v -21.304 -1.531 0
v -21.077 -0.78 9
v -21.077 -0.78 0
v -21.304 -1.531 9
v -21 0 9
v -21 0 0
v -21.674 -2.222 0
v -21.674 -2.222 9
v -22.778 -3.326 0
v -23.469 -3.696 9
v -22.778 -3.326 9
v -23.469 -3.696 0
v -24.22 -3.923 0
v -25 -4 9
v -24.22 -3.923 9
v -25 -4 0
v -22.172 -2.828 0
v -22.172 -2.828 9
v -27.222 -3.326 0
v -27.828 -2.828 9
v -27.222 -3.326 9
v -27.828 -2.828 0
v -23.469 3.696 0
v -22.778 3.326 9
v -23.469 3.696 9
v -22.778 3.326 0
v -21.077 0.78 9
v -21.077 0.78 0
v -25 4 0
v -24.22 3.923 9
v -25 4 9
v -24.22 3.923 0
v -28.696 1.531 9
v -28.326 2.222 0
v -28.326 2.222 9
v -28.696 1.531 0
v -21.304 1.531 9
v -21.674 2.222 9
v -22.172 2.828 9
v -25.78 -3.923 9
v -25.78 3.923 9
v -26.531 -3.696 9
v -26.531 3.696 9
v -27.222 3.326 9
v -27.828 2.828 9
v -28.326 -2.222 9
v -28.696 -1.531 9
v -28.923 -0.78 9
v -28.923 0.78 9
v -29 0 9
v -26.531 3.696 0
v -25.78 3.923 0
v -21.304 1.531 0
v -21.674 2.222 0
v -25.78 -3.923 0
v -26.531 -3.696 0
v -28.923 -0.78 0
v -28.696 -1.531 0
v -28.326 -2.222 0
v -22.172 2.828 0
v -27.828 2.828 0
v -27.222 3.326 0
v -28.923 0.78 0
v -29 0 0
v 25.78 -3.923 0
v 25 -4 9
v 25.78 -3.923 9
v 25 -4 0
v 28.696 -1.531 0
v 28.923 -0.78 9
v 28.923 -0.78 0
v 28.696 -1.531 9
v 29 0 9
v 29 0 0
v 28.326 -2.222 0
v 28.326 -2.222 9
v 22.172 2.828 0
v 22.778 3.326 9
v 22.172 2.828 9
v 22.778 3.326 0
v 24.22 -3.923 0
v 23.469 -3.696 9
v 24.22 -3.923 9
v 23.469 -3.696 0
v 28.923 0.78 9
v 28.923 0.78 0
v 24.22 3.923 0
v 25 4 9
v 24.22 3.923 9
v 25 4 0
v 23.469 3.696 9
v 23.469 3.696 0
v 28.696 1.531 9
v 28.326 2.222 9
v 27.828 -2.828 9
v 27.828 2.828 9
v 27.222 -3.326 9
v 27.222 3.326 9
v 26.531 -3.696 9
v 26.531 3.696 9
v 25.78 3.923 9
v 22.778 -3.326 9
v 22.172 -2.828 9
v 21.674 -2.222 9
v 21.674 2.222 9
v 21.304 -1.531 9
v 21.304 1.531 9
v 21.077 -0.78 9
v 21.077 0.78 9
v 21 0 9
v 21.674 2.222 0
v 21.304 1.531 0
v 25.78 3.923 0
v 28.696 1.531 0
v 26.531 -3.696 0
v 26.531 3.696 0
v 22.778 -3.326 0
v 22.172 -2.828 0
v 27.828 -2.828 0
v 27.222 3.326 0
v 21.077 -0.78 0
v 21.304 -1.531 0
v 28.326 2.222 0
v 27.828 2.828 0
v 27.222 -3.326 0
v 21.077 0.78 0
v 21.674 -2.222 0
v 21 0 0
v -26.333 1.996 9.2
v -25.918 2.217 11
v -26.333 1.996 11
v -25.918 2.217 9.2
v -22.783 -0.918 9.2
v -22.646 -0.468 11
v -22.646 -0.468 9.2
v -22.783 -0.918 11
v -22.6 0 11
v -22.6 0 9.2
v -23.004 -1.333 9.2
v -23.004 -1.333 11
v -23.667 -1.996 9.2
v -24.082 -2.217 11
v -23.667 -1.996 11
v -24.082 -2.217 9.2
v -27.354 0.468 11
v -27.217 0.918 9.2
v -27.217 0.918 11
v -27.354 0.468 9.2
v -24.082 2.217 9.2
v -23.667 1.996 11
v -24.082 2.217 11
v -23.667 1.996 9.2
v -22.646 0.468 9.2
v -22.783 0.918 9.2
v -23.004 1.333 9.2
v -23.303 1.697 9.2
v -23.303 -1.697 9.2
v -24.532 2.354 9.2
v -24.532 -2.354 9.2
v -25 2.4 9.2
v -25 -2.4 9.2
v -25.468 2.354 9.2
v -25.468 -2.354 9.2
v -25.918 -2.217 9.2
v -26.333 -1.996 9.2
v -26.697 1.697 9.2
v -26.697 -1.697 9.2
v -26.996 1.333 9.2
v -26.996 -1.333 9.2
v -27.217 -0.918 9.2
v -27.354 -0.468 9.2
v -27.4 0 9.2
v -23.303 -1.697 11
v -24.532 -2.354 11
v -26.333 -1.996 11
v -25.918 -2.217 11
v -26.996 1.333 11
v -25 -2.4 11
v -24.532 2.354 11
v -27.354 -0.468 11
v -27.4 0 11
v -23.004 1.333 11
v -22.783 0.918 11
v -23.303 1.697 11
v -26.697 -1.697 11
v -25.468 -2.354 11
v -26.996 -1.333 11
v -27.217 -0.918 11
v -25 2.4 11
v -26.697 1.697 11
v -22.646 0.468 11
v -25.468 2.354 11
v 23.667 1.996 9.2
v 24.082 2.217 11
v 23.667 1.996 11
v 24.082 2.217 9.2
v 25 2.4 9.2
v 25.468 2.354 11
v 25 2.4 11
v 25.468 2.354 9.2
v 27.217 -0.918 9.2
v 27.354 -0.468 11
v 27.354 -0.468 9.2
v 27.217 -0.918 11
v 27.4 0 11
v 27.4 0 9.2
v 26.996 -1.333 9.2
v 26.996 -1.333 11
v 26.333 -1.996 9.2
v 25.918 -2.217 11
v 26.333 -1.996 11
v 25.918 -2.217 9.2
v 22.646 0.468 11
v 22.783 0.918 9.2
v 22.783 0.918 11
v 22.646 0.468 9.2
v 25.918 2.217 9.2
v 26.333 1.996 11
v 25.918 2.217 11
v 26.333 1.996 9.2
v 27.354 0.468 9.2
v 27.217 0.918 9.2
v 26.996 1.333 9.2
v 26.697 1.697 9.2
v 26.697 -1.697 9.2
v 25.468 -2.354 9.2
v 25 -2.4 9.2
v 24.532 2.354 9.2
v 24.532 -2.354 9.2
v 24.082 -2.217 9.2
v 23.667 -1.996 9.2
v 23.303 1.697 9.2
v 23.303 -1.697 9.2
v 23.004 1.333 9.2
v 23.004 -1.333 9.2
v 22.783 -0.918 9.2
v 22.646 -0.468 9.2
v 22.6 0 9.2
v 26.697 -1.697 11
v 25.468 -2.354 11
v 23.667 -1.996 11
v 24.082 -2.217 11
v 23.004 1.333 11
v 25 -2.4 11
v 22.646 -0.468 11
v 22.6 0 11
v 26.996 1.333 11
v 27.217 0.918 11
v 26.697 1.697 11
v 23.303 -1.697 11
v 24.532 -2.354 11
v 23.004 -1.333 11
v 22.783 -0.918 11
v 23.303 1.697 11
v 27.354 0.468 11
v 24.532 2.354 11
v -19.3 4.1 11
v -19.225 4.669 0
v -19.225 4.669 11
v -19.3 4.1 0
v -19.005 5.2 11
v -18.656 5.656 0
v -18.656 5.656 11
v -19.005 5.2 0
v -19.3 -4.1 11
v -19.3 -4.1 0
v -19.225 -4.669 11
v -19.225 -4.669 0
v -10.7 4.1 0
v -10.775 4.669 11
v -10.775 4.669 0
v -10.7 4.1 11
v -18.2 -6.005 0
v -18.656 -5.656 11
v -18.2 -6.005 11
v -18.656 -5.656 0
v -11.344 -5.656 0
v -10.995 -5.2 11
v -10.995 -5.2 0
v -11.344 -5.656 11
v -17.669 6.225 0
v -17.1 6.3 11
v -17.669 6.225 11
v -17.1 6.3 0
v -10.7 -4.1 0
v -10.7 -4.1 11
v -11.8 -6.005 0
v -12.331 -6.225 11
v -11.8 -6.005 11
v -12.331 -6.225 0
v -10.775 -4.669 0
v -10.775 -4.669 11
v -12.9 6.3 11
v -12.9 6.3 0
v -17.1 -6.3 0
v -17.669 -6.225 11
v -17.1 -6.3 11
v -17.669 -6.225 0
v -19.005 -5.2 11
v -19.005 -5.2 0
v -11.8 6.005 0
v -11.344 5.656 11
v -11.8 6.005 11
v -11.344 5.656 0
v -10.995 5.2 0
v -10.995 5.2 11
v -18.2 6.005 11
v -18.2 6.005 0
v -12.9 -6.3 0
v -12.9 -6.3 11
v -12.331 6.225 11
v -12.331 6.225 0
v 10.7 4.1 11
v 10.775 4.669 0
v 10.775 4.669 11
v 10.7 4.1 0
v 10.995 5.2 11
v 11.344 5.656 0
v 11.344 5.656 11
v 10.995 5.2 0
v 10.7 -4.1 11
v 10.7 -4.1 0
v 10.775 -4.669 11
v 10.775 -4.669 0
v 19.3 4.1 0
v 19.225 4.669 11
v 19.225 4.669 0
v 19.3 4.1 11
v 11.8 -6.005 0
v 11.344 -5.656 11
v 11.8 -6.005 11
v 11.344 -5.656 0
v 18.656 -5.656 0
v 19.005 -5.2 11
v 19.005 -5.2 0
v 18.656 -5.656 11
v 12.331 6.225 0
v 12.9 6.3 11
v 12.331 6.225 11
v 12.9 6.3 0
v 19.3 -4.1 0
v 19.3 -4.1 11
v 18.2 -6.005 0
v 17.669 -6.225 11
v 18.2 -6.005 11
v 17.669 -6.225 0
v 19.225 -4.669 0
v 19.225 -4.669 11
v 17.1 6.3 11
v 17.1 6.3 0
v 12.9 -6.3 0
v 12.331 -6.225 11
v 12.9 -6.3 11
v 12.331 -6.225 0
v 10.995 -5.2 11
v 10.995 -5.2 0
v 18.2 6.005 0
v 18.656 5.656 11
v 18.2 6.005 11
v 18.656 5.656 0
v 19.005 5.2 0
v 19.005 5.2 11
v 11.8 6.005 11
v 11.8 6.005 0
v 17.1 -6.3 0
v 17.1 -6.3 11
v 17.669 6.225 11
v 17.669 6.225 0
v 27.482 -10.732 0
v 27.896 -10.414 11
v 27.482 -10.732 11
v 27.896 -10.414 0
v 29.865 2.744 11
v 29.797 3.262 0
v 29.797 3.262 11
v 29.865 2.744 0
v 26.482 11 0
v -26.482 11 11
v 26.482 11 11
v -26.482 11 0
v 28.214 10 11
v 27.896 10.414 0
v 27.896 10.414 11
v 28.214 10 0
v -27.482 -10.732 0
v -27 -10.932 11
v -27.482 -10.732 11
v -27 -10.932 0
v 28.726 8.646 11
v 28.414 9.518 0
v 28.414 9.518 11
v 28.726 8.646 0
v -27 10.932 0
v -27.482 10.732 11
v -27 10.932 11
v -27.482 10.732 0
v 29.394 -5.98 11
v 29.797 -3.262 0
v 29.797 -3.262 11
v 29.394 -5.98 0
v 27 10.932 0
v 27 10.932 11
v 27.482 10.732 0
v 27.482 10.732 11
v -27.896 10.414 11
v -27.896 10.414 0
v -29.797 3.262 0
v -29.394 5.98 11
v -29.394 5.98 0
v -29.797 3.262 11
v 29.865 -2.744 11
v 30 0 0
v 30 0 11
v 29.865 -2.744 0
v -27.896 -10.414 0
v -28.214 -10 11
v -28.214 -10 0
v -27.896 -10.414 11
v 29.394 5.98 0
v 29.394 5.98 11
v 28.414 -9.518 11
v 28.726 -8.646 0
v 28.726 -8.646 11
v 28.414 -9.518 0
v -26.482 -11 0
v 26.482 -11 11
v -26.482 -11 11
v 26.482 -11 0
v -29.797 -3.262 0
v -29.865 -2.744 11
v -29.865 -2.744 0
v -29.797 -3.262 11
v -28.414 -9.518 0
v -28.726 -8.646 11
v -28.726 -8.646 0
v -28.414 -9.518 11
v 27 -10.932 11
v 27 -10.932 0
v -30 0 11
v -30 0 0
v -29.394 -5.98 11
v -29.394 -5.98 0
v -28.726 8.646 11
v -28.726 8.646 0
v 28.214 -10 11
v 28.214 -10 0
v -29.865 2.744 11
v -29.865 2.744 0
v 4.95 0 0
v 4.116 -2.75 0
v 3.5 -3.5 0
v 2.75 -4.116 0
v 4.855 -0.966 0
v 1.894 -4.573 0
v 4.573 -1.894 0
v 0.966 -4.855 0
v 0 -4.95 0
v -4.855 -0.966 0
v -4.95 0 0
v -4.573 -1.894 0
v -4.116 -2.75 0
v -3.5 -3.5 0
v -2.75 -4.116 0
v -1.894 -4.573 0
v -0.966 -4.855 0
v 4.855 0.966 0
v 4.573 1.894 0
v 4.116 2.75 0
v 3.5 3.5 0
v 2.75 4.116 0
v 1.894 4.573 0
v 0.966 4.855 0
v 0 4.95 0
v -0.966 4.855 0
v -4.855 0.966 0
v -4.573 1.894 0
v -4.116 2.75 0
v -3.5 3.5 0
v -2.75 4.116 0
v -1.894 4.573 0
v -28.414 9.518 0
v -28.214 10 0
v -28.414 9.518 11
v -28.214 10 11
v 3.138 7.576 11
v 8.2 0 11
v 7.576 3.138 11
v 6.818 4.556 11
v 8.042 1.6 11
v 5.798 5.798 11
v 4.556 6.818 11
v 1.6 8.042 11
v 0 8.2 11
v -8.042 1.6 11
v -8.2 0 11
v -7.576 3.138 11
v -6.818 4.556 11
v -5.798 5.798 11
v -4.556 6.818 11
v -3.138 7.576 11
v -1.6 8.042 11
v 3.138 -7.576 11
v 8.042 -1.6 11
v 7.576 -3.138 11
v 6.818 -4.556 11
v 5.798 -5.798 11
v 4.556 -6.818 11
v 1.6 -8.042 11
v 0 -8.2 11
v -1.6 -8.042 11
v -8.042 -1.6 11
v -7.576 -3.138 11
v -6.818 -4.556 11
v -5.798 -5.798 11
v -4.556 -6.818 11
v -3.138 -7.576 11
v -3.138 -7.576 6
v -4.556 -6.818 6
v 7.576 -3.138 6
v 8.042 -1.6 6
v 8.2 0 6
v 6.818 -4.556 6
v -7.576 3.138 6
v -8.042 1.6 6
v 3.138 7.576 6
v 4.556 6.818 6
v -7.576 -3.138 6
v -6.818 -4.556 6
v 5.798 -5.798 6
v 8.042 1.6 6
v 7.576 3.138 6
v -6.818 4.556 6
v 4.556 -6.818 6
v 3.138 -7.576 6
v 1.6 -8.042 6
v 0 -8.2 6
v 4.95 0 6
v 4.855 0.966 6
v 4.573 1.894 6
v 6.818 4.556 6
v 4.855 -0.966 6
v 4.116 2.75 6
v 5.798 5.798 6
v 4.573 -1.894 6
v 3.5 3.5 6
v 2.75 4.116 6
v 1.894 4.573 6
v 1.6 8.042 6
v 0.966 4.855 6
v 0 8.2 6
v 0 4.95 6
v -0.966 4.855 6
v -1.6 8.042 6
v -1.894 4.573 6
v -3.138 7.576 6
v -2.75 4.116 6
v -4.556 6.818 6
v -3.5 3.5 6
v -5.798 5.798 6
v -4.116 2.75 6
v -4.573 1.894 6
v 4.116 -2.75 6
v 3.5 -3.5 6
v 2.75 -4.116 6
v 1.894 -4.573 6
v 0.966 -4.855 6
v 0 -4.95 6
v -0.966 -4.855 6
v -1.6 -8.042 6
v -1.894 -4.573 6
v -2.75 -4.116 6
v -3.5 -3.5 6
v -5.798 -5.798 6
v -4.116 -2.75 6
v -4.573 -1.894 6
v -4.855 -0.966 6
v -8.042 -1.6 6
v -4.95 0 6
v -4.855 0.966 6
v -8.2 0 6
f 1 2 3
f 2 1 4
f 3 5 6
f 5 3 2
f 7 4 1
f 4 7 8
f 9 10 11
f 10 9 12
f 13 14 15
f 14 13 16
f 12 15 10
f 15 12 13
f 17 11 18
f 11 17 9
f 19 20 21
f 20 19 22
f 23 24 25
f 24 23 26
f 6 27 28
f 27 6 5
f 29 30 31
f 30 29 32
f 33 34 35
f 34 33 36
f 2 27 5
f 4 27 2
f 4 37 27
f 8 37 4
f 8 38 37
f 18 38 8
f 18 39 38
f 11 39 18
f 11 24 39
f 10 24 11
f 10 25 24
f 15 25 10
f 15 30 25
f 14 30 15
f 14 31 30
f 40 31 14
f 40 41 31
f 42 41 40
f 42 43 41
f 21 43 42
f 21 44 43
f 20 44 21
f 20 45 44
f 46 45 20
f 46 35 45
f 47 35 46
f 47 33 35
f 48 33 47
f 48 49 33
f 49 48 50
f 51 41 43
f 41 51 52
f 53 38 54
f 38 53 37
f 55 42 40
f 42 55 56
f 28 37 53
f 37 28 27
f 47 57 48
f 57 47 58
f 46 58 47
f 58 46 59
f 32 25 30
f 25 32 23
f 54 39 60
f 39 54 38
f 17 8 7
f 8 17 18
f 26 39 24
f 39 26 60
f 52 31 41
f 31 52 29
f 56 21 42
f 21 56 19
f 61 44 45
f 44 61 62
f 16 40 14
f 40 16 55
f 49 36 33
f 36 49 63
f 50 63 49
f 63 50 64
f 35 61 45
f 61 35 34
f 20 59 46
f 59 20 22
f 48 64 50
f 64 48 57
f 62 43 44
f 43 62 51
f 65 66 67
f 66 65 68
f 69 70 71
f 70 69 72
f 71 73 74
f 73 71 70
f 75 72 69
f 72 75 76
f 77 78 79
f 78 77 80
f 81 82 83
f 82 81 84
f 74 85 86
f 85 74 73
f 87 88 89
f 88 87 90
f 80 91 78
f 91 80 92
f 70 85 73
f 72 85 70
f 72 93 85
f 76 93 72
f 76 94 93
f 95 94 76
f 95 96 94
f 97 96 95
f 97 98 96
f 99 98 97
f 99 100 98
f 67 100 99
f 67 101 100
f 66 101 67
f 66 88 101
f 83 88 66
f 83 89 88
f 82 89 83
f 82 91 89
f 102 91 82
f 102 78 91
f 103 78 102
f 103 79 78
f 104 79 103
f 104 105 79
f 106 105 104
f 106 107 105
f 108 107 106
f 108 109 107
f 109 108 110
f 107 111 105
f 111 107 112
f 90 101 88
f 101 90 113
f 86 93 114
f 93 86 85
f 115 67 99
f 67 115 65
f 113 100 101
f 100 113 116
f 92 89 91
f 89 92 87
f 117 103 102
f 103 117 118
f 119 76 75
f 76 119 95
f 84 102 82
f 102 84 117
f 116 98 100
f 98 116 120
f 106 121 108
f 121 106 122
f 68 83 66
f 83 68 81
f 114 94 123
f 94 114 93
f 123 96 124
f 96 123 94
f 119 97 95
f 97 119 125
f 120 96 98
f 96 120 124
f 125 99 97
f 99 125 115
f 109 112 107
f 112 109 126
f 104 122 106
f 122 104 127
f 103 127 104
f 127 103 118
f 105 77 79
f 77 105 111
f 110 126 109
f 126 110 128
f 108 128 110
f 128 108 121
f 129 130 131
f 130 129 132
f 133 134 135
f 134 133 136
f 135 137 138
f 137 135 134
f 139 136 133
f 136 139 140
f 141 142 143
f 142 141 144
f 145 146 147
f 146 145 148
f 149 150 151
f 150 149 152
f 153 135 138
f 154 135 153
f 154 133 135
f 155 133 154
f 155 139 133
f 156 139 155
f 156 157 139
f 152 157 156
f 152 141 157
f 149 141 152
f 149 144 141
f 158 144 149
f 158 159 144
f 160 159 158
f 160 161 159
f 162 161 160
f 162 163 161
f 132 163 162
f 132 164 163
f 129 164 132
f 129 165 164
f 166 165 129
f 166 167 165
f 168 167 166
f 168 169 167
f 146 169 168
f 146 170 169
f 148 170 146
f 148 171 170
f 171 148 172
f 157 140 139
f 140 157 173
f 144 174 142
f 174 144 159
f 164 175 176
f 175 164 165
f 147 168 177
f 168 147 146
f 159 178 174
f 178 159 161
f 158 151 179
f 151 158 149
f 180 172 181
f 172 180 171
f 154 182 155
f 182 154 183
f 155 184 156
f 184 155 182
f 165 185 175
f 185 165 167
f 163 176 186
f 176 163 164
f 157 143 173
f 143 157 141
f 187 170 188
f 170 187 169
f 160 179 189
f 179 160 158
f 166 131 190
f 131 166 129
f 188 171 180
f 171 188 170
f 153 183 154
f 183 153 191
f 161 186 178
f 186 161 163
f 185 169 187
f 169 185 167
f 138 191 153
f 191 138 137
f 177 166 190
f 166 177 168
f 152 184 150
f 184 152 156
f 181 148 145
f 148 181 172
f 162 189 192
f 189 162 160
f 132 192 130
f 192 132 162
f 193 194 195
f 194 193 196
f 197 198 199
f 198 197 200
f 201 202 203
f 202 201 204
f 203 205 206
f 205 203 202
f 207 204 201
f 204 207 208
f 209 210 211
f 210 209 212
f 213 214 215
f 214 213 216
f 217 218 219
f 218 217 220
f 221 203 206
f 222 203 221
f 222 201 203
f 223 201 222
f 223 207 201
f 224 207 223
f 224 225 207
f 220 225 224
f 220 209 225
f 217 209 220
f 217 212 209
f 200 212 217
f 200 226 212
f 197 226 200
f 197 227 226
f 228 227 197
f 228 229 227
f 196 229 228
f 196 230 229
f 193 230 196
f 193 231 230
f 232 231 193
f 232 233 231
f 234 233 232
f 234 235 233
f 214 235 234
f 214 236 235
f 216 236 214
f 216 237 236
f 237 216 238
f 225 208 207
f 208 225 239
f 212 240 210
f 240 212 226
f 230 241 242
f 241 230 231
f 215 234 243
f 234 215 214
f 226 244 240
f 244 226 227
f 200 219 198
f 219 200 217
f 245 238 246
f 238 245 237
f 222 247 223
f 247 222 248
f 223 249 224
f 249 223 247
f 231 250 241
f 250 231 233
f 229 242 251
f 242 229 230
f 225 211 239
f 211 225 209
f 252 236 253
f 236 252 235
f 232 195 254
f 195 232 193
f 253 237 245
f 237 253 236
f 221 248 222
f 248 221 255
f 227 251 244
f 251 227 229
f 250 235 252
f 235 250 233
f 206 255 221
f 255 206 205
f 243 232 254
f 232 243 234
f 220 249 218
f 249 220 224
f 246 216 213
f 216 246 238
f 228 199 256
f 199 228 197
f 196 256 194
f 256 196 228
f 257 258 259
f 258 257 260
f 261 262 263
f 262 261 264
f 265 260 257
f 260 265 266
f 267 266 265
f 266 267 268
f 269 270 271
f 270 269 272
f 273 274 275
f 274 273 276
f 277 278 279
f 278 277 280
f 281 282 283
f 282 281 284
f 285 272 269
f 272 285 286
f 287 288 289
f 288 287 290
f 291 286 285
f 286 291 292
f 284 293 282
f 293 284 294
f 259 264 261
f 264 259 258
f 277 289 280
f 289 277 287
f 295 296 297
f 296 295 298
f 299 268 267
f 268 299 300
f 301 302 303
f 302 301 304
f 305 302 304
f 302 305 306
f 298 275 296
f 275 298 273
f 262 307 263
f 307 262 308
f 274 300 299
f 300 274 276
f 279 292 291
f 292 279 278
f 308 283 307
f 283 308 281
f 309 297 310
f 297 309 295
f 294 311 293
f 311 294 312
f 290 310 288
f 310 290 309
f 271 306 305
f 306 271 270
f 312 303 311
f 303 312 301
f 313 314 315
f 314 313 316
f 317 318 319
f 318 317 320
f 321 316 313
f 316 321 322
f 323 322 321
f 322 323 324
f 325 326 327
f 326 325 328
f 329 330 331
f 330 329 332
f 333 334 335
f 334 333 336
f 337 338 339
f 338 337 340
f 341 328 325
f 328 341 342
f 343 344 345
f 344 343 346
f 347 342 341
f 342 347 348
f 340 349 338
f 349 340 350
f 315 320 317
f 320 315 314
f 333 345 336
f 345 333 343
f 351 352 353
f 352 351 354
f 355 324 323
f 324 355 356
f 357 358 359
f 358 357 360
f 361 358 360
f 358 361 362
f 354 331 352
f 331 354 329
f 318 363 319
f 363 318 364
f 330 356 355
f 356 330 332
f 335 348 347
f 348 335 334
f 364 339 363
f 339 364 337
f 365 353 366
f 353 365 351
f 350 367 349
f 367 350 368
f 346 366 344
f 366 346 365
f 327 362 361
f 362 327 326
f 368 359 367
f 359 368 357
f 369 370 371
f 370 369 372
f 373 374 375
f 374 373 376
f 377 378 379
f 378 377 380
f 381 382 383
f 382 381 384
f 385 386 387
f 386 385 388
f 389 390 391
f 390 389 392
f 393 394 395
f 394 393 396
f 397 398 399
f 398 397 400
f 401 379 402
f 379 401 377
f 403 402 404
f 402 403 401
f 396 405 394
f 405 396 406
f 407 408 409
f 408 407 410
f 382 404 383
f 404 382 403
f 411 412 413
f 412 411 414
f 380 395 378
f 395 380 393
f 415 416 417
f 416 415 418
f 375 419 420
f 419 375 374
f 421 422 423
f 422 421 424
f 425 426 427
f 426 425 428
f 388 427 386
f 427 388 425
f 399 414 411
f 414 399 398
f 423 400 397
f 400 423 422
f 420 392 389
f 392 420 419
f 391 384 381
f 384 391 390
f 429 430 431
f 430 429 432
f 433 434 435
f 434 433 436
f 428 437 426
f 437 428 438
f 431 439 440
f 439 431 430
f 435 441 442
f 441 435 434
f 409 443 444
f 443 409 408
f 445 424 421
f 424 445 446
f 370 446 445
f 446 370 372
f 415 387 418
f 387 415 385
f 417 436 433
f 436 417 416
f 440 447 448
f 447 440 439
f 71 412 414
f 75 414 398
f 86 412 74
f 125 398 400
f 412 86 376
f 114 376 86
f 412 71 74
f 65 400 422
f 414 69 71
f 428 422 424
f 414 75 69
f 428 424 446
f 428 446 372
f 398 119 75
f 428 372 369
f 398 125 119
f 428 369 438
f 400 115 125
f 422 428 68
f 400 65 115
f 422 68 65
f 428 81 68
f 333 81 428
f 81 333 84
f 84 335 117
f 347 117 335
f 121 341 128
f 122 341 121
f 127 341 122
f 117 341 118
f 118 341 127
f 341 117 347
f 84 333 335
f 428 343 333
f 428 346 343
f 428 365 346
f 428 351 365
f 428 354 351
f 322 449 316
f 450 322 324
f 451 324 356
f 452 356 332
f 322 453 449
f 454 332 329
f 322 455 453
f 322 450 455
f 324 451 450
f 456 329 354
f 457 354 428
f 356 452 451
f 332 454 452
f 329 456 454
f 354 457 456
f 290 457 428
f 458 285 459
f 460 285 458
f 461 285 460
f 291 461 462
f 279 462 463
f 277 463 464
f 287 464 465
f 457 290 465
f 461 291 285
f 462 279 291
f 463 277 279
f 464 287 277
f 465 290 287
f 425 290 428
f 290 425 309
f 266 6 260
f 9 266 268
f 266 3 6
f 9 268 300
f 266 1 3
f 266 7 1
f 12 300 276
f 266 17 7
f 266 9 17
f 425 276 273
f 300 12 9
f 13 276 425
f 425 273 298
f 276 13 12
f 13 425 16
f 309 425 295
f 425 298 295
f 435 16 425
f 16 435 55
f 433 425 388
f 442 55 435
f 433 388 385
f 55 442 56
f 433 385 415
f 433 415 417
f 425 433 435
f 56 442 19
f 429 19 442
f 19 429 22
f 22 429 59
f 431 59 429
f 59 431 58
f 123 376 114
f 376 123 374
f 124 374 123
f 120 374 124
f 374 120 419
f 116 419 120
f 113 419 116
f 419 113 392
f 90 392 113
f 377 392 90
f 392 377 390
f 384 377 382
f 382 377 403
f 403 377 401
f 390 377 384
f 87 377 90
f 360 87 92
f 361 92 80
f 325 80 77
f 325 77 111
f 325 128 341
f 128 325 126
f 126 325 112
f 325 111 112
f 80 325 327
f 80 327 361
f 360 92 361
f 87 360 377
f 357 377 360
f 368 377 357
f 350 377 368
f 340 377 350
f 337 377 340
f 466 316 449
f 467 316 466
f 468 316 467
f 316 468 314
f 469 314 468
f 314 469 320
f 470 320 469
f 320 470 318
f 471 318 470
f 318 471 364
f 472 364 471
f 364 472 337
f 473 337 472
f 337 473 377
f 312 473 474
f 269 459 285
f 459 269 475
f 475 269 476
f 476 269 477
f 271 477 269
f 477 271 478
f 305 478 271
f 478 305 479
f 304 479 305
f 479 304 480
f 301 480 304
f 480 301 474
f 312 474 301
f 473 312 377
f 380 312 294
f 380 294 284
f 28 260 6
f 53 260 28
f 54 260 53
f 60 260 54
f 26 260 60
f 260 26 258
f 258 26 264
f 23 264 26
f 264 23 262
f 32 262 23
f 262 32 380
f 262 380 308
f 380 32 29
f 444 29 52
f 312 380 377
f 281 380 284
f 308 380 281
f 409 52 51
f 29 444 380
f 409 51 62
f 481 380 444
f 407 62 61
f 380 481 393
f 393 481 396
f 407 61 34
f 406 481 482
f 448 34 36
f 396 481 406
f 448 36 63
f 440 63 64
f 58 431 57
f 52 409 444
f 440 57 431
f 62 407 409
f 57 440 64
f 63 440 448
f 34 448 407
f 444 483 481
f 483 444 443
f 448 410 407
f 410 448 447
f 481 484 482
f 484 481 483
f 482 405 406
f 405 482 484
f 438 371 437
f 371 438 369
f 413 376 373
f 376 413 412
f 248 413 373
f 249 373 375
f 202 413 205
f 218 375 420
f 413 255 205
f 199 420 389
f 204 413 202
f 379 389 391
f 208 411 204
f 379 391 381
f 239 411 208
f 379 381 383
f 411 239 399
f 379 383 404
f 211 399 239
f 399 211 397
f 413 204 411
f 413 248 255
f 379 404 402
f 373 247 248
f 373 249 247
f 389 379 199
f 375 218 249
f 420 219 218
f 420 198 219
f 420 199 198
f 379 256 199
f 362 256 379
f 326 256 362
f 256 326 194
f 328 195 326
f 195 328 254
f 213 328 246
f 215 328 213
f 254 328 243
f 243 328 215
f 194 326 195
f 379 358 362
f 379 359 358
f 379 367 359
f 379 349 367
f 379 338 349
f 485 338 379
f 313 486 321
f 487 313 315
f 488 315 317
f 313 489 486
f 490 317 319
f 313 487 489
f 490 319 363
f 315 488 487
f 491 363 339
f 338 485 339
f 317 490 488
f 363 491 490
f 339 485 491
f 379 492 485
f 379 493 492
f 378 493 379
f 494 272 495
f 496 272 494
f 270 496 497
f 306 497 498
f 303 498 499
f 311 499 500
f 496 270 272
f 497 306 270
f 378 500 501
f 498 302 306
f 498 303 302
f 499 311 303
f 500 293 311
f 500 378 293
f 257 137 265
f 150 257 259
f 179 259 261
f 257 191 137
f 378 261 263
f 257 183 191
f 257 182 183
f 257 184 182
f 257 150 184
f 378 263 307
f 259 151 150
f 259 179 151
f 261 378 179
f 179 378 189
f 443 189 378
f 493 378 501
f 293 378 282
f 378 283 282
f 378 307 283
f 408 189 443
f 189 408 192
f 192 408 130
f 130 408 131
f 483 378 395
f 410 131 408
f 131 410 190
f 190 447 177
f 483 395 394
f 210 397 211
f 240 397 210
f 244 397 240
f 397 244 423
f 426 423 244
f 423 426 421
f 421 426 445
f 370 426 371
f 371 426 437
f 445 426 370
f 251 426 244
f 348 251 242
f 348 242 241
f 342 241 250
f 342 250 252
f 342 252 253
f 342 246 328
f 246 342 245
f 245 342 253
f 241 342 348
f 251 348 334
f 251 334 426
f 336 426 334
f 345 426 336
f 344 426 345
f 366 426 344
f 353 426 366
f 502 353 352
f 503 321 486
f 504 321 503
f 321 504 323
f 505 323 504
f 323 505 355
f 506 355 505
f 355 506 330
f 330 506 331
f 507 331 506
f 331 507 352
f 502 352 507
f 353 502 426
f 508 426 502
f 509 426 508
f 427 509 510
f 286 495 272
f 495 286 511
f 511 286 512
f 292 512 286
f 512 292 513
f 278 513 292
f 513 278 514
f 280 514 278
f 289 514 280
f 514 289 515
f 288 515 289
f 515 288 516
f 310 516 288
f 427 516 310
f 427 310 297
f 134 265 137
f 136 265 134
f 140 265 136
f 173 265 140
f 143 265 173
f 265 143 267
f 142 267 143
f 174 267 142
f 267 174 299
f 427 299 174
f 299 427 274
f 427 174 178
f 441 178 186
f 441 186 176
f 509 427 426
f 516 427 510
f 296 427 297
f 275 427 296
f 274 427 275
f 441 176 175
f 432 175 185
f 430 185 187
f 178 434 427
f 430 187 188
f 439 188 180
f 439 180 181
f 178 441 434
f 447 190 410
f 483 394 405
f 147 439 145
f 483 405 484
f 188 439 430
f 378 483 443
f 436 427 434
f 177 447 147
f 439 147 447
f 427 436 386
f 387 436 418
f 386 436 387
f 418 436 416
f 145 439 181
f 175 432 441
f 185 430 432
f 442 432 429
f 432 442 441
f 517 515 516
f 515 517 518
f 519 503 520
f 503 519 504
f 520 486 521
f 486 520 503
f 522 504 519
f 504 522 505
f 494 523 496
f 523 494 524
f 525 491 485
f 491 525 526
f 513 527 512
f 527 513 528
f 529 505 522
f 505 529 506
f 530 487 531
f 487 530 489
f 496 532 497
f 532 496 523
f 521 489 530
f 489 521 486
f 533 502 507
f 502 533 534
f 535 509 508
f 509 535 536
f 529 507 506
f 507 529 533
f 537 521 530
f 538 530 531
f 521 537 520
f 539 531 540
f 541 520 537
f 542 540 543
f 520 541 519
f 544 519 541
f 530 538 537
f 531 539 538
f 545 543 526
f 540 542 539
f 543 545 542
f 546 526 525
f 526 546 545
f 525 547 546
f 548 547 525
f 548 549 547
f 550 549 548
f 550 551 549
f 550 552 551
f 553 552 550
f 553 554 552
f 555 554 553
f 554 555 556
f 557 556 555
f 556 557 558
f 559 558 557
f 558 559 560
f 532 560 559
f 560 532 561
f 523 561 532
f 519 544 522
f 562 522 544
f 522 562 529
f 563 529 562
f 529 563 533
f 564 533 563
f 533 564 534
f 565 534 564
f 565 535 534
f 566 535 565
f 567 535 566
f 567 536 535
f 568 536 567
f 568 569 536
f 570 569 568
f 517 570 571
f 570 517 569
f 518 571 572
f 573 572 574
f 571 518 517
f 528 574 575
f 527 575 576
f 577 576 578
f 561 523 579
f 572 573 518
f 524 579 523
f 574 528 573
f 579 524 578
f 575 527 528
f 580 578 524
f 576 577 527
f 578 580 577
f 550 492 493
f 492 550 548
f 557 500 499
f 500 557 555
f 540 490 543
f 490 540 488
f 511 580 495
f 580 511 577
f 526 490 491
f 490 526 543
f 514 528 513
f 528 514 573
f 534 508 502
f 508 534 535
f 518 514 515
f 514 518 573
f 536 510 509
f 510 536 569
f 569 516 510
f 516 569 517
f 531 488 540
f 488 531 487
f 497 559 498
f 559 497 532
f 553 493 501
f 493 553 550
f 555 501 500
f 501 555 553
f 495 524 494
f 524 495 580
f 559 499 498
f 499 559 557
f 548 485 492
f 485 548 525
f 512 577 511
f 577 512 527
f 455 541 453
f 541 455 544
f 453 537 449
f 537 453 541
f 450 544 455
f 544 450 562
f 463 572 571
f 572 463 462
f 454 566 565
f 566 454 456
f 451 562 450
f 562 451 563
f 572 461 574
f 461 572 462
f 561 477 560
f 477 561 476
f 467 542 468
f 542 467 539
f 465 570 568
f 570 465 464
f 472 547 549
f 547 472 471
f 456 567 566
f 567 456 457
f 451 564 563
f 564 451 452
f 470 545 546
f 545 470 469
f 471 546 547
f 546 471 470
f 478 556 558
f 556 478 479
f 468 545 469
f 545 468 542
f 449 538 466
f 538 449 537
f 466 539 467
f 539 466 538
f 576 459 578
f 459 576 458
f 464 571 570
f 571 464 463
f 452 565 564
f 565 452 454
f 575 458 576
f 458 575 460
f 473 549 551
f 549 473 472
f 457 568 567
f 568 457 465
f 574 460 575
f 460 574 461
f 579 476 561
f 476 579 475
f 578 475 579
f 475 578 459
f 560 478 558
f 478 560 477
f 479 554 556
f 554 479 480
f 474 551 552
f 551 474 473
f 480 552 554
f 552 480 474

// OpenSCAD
module bowden_clamp() difference() {
	linear_extrude(height=11,convexity=30) difference() {
		// basic shape
		minkowski() {
			intersection() {
				square([60-2,22-4],center=true);
				circle(r=30-2,$fn=64);
			}
			// rounded corners
			circle(r=2,$fn=24);
		}
	}
	// M4 socket heads
	for(x=[-25,25]) translate([x,0,2])
		cylinder(r=4,h=12,$fn=32);

	// M4 Mounting holes
	for(x=[-25,25]) translate([x,0,-1])
		cylinder(r=2.4,h=2.8,$fn=32);

	// groove mount
	translate([0,0,-1]) cylinder(r=8.2,h=6,$fn=32);

	// M6 captive nut
//	cylinder(r=6.9,h=8,$fn=6); // LP

	// M6 pneumatic fitting
	cylinder(r=4.95,h=14,$fn=32); // LP

	// unnecessary vents
	for(x=[-15,15]) translate([x,0,-1]) minkowski() {
		cube([4.2,8.2,13],center=true);
		cylinder(r=2.2,h=13,$fn=24);
	}
}

module wood_mount() difference() {
	// basic shape
	minkowski() {
		intersection() {
			square([60-1.8,22-3.6],center=true);
			circle(r=30-1.8,$fn=64);
		}
		// rounded corners
		circle(r=2,$fn=24);
	}
	// M4 Mounting holes
	for(x=[-25,25]) translate([x,0])
		circle(r=2,$fn=32);

	// groove mount
	circle(r=5.9,$fn=32);
	translate([0,-11]) square([11.8,22], center=true);

	// unnecessary vents
	for(x=[-15,15]) translate([x,0]) minkowski() {
		square([4,8],center=true);
		circle(r=2,$fn=24);
	}

}

%translate([0,0,-5]) linear_extrude(height=5,convexity=30) wood_mount();
bowden_clamp();

!translate([0,0,11]) rotate([180,0,0]) bowden_clamp();
*!wood_mount();
